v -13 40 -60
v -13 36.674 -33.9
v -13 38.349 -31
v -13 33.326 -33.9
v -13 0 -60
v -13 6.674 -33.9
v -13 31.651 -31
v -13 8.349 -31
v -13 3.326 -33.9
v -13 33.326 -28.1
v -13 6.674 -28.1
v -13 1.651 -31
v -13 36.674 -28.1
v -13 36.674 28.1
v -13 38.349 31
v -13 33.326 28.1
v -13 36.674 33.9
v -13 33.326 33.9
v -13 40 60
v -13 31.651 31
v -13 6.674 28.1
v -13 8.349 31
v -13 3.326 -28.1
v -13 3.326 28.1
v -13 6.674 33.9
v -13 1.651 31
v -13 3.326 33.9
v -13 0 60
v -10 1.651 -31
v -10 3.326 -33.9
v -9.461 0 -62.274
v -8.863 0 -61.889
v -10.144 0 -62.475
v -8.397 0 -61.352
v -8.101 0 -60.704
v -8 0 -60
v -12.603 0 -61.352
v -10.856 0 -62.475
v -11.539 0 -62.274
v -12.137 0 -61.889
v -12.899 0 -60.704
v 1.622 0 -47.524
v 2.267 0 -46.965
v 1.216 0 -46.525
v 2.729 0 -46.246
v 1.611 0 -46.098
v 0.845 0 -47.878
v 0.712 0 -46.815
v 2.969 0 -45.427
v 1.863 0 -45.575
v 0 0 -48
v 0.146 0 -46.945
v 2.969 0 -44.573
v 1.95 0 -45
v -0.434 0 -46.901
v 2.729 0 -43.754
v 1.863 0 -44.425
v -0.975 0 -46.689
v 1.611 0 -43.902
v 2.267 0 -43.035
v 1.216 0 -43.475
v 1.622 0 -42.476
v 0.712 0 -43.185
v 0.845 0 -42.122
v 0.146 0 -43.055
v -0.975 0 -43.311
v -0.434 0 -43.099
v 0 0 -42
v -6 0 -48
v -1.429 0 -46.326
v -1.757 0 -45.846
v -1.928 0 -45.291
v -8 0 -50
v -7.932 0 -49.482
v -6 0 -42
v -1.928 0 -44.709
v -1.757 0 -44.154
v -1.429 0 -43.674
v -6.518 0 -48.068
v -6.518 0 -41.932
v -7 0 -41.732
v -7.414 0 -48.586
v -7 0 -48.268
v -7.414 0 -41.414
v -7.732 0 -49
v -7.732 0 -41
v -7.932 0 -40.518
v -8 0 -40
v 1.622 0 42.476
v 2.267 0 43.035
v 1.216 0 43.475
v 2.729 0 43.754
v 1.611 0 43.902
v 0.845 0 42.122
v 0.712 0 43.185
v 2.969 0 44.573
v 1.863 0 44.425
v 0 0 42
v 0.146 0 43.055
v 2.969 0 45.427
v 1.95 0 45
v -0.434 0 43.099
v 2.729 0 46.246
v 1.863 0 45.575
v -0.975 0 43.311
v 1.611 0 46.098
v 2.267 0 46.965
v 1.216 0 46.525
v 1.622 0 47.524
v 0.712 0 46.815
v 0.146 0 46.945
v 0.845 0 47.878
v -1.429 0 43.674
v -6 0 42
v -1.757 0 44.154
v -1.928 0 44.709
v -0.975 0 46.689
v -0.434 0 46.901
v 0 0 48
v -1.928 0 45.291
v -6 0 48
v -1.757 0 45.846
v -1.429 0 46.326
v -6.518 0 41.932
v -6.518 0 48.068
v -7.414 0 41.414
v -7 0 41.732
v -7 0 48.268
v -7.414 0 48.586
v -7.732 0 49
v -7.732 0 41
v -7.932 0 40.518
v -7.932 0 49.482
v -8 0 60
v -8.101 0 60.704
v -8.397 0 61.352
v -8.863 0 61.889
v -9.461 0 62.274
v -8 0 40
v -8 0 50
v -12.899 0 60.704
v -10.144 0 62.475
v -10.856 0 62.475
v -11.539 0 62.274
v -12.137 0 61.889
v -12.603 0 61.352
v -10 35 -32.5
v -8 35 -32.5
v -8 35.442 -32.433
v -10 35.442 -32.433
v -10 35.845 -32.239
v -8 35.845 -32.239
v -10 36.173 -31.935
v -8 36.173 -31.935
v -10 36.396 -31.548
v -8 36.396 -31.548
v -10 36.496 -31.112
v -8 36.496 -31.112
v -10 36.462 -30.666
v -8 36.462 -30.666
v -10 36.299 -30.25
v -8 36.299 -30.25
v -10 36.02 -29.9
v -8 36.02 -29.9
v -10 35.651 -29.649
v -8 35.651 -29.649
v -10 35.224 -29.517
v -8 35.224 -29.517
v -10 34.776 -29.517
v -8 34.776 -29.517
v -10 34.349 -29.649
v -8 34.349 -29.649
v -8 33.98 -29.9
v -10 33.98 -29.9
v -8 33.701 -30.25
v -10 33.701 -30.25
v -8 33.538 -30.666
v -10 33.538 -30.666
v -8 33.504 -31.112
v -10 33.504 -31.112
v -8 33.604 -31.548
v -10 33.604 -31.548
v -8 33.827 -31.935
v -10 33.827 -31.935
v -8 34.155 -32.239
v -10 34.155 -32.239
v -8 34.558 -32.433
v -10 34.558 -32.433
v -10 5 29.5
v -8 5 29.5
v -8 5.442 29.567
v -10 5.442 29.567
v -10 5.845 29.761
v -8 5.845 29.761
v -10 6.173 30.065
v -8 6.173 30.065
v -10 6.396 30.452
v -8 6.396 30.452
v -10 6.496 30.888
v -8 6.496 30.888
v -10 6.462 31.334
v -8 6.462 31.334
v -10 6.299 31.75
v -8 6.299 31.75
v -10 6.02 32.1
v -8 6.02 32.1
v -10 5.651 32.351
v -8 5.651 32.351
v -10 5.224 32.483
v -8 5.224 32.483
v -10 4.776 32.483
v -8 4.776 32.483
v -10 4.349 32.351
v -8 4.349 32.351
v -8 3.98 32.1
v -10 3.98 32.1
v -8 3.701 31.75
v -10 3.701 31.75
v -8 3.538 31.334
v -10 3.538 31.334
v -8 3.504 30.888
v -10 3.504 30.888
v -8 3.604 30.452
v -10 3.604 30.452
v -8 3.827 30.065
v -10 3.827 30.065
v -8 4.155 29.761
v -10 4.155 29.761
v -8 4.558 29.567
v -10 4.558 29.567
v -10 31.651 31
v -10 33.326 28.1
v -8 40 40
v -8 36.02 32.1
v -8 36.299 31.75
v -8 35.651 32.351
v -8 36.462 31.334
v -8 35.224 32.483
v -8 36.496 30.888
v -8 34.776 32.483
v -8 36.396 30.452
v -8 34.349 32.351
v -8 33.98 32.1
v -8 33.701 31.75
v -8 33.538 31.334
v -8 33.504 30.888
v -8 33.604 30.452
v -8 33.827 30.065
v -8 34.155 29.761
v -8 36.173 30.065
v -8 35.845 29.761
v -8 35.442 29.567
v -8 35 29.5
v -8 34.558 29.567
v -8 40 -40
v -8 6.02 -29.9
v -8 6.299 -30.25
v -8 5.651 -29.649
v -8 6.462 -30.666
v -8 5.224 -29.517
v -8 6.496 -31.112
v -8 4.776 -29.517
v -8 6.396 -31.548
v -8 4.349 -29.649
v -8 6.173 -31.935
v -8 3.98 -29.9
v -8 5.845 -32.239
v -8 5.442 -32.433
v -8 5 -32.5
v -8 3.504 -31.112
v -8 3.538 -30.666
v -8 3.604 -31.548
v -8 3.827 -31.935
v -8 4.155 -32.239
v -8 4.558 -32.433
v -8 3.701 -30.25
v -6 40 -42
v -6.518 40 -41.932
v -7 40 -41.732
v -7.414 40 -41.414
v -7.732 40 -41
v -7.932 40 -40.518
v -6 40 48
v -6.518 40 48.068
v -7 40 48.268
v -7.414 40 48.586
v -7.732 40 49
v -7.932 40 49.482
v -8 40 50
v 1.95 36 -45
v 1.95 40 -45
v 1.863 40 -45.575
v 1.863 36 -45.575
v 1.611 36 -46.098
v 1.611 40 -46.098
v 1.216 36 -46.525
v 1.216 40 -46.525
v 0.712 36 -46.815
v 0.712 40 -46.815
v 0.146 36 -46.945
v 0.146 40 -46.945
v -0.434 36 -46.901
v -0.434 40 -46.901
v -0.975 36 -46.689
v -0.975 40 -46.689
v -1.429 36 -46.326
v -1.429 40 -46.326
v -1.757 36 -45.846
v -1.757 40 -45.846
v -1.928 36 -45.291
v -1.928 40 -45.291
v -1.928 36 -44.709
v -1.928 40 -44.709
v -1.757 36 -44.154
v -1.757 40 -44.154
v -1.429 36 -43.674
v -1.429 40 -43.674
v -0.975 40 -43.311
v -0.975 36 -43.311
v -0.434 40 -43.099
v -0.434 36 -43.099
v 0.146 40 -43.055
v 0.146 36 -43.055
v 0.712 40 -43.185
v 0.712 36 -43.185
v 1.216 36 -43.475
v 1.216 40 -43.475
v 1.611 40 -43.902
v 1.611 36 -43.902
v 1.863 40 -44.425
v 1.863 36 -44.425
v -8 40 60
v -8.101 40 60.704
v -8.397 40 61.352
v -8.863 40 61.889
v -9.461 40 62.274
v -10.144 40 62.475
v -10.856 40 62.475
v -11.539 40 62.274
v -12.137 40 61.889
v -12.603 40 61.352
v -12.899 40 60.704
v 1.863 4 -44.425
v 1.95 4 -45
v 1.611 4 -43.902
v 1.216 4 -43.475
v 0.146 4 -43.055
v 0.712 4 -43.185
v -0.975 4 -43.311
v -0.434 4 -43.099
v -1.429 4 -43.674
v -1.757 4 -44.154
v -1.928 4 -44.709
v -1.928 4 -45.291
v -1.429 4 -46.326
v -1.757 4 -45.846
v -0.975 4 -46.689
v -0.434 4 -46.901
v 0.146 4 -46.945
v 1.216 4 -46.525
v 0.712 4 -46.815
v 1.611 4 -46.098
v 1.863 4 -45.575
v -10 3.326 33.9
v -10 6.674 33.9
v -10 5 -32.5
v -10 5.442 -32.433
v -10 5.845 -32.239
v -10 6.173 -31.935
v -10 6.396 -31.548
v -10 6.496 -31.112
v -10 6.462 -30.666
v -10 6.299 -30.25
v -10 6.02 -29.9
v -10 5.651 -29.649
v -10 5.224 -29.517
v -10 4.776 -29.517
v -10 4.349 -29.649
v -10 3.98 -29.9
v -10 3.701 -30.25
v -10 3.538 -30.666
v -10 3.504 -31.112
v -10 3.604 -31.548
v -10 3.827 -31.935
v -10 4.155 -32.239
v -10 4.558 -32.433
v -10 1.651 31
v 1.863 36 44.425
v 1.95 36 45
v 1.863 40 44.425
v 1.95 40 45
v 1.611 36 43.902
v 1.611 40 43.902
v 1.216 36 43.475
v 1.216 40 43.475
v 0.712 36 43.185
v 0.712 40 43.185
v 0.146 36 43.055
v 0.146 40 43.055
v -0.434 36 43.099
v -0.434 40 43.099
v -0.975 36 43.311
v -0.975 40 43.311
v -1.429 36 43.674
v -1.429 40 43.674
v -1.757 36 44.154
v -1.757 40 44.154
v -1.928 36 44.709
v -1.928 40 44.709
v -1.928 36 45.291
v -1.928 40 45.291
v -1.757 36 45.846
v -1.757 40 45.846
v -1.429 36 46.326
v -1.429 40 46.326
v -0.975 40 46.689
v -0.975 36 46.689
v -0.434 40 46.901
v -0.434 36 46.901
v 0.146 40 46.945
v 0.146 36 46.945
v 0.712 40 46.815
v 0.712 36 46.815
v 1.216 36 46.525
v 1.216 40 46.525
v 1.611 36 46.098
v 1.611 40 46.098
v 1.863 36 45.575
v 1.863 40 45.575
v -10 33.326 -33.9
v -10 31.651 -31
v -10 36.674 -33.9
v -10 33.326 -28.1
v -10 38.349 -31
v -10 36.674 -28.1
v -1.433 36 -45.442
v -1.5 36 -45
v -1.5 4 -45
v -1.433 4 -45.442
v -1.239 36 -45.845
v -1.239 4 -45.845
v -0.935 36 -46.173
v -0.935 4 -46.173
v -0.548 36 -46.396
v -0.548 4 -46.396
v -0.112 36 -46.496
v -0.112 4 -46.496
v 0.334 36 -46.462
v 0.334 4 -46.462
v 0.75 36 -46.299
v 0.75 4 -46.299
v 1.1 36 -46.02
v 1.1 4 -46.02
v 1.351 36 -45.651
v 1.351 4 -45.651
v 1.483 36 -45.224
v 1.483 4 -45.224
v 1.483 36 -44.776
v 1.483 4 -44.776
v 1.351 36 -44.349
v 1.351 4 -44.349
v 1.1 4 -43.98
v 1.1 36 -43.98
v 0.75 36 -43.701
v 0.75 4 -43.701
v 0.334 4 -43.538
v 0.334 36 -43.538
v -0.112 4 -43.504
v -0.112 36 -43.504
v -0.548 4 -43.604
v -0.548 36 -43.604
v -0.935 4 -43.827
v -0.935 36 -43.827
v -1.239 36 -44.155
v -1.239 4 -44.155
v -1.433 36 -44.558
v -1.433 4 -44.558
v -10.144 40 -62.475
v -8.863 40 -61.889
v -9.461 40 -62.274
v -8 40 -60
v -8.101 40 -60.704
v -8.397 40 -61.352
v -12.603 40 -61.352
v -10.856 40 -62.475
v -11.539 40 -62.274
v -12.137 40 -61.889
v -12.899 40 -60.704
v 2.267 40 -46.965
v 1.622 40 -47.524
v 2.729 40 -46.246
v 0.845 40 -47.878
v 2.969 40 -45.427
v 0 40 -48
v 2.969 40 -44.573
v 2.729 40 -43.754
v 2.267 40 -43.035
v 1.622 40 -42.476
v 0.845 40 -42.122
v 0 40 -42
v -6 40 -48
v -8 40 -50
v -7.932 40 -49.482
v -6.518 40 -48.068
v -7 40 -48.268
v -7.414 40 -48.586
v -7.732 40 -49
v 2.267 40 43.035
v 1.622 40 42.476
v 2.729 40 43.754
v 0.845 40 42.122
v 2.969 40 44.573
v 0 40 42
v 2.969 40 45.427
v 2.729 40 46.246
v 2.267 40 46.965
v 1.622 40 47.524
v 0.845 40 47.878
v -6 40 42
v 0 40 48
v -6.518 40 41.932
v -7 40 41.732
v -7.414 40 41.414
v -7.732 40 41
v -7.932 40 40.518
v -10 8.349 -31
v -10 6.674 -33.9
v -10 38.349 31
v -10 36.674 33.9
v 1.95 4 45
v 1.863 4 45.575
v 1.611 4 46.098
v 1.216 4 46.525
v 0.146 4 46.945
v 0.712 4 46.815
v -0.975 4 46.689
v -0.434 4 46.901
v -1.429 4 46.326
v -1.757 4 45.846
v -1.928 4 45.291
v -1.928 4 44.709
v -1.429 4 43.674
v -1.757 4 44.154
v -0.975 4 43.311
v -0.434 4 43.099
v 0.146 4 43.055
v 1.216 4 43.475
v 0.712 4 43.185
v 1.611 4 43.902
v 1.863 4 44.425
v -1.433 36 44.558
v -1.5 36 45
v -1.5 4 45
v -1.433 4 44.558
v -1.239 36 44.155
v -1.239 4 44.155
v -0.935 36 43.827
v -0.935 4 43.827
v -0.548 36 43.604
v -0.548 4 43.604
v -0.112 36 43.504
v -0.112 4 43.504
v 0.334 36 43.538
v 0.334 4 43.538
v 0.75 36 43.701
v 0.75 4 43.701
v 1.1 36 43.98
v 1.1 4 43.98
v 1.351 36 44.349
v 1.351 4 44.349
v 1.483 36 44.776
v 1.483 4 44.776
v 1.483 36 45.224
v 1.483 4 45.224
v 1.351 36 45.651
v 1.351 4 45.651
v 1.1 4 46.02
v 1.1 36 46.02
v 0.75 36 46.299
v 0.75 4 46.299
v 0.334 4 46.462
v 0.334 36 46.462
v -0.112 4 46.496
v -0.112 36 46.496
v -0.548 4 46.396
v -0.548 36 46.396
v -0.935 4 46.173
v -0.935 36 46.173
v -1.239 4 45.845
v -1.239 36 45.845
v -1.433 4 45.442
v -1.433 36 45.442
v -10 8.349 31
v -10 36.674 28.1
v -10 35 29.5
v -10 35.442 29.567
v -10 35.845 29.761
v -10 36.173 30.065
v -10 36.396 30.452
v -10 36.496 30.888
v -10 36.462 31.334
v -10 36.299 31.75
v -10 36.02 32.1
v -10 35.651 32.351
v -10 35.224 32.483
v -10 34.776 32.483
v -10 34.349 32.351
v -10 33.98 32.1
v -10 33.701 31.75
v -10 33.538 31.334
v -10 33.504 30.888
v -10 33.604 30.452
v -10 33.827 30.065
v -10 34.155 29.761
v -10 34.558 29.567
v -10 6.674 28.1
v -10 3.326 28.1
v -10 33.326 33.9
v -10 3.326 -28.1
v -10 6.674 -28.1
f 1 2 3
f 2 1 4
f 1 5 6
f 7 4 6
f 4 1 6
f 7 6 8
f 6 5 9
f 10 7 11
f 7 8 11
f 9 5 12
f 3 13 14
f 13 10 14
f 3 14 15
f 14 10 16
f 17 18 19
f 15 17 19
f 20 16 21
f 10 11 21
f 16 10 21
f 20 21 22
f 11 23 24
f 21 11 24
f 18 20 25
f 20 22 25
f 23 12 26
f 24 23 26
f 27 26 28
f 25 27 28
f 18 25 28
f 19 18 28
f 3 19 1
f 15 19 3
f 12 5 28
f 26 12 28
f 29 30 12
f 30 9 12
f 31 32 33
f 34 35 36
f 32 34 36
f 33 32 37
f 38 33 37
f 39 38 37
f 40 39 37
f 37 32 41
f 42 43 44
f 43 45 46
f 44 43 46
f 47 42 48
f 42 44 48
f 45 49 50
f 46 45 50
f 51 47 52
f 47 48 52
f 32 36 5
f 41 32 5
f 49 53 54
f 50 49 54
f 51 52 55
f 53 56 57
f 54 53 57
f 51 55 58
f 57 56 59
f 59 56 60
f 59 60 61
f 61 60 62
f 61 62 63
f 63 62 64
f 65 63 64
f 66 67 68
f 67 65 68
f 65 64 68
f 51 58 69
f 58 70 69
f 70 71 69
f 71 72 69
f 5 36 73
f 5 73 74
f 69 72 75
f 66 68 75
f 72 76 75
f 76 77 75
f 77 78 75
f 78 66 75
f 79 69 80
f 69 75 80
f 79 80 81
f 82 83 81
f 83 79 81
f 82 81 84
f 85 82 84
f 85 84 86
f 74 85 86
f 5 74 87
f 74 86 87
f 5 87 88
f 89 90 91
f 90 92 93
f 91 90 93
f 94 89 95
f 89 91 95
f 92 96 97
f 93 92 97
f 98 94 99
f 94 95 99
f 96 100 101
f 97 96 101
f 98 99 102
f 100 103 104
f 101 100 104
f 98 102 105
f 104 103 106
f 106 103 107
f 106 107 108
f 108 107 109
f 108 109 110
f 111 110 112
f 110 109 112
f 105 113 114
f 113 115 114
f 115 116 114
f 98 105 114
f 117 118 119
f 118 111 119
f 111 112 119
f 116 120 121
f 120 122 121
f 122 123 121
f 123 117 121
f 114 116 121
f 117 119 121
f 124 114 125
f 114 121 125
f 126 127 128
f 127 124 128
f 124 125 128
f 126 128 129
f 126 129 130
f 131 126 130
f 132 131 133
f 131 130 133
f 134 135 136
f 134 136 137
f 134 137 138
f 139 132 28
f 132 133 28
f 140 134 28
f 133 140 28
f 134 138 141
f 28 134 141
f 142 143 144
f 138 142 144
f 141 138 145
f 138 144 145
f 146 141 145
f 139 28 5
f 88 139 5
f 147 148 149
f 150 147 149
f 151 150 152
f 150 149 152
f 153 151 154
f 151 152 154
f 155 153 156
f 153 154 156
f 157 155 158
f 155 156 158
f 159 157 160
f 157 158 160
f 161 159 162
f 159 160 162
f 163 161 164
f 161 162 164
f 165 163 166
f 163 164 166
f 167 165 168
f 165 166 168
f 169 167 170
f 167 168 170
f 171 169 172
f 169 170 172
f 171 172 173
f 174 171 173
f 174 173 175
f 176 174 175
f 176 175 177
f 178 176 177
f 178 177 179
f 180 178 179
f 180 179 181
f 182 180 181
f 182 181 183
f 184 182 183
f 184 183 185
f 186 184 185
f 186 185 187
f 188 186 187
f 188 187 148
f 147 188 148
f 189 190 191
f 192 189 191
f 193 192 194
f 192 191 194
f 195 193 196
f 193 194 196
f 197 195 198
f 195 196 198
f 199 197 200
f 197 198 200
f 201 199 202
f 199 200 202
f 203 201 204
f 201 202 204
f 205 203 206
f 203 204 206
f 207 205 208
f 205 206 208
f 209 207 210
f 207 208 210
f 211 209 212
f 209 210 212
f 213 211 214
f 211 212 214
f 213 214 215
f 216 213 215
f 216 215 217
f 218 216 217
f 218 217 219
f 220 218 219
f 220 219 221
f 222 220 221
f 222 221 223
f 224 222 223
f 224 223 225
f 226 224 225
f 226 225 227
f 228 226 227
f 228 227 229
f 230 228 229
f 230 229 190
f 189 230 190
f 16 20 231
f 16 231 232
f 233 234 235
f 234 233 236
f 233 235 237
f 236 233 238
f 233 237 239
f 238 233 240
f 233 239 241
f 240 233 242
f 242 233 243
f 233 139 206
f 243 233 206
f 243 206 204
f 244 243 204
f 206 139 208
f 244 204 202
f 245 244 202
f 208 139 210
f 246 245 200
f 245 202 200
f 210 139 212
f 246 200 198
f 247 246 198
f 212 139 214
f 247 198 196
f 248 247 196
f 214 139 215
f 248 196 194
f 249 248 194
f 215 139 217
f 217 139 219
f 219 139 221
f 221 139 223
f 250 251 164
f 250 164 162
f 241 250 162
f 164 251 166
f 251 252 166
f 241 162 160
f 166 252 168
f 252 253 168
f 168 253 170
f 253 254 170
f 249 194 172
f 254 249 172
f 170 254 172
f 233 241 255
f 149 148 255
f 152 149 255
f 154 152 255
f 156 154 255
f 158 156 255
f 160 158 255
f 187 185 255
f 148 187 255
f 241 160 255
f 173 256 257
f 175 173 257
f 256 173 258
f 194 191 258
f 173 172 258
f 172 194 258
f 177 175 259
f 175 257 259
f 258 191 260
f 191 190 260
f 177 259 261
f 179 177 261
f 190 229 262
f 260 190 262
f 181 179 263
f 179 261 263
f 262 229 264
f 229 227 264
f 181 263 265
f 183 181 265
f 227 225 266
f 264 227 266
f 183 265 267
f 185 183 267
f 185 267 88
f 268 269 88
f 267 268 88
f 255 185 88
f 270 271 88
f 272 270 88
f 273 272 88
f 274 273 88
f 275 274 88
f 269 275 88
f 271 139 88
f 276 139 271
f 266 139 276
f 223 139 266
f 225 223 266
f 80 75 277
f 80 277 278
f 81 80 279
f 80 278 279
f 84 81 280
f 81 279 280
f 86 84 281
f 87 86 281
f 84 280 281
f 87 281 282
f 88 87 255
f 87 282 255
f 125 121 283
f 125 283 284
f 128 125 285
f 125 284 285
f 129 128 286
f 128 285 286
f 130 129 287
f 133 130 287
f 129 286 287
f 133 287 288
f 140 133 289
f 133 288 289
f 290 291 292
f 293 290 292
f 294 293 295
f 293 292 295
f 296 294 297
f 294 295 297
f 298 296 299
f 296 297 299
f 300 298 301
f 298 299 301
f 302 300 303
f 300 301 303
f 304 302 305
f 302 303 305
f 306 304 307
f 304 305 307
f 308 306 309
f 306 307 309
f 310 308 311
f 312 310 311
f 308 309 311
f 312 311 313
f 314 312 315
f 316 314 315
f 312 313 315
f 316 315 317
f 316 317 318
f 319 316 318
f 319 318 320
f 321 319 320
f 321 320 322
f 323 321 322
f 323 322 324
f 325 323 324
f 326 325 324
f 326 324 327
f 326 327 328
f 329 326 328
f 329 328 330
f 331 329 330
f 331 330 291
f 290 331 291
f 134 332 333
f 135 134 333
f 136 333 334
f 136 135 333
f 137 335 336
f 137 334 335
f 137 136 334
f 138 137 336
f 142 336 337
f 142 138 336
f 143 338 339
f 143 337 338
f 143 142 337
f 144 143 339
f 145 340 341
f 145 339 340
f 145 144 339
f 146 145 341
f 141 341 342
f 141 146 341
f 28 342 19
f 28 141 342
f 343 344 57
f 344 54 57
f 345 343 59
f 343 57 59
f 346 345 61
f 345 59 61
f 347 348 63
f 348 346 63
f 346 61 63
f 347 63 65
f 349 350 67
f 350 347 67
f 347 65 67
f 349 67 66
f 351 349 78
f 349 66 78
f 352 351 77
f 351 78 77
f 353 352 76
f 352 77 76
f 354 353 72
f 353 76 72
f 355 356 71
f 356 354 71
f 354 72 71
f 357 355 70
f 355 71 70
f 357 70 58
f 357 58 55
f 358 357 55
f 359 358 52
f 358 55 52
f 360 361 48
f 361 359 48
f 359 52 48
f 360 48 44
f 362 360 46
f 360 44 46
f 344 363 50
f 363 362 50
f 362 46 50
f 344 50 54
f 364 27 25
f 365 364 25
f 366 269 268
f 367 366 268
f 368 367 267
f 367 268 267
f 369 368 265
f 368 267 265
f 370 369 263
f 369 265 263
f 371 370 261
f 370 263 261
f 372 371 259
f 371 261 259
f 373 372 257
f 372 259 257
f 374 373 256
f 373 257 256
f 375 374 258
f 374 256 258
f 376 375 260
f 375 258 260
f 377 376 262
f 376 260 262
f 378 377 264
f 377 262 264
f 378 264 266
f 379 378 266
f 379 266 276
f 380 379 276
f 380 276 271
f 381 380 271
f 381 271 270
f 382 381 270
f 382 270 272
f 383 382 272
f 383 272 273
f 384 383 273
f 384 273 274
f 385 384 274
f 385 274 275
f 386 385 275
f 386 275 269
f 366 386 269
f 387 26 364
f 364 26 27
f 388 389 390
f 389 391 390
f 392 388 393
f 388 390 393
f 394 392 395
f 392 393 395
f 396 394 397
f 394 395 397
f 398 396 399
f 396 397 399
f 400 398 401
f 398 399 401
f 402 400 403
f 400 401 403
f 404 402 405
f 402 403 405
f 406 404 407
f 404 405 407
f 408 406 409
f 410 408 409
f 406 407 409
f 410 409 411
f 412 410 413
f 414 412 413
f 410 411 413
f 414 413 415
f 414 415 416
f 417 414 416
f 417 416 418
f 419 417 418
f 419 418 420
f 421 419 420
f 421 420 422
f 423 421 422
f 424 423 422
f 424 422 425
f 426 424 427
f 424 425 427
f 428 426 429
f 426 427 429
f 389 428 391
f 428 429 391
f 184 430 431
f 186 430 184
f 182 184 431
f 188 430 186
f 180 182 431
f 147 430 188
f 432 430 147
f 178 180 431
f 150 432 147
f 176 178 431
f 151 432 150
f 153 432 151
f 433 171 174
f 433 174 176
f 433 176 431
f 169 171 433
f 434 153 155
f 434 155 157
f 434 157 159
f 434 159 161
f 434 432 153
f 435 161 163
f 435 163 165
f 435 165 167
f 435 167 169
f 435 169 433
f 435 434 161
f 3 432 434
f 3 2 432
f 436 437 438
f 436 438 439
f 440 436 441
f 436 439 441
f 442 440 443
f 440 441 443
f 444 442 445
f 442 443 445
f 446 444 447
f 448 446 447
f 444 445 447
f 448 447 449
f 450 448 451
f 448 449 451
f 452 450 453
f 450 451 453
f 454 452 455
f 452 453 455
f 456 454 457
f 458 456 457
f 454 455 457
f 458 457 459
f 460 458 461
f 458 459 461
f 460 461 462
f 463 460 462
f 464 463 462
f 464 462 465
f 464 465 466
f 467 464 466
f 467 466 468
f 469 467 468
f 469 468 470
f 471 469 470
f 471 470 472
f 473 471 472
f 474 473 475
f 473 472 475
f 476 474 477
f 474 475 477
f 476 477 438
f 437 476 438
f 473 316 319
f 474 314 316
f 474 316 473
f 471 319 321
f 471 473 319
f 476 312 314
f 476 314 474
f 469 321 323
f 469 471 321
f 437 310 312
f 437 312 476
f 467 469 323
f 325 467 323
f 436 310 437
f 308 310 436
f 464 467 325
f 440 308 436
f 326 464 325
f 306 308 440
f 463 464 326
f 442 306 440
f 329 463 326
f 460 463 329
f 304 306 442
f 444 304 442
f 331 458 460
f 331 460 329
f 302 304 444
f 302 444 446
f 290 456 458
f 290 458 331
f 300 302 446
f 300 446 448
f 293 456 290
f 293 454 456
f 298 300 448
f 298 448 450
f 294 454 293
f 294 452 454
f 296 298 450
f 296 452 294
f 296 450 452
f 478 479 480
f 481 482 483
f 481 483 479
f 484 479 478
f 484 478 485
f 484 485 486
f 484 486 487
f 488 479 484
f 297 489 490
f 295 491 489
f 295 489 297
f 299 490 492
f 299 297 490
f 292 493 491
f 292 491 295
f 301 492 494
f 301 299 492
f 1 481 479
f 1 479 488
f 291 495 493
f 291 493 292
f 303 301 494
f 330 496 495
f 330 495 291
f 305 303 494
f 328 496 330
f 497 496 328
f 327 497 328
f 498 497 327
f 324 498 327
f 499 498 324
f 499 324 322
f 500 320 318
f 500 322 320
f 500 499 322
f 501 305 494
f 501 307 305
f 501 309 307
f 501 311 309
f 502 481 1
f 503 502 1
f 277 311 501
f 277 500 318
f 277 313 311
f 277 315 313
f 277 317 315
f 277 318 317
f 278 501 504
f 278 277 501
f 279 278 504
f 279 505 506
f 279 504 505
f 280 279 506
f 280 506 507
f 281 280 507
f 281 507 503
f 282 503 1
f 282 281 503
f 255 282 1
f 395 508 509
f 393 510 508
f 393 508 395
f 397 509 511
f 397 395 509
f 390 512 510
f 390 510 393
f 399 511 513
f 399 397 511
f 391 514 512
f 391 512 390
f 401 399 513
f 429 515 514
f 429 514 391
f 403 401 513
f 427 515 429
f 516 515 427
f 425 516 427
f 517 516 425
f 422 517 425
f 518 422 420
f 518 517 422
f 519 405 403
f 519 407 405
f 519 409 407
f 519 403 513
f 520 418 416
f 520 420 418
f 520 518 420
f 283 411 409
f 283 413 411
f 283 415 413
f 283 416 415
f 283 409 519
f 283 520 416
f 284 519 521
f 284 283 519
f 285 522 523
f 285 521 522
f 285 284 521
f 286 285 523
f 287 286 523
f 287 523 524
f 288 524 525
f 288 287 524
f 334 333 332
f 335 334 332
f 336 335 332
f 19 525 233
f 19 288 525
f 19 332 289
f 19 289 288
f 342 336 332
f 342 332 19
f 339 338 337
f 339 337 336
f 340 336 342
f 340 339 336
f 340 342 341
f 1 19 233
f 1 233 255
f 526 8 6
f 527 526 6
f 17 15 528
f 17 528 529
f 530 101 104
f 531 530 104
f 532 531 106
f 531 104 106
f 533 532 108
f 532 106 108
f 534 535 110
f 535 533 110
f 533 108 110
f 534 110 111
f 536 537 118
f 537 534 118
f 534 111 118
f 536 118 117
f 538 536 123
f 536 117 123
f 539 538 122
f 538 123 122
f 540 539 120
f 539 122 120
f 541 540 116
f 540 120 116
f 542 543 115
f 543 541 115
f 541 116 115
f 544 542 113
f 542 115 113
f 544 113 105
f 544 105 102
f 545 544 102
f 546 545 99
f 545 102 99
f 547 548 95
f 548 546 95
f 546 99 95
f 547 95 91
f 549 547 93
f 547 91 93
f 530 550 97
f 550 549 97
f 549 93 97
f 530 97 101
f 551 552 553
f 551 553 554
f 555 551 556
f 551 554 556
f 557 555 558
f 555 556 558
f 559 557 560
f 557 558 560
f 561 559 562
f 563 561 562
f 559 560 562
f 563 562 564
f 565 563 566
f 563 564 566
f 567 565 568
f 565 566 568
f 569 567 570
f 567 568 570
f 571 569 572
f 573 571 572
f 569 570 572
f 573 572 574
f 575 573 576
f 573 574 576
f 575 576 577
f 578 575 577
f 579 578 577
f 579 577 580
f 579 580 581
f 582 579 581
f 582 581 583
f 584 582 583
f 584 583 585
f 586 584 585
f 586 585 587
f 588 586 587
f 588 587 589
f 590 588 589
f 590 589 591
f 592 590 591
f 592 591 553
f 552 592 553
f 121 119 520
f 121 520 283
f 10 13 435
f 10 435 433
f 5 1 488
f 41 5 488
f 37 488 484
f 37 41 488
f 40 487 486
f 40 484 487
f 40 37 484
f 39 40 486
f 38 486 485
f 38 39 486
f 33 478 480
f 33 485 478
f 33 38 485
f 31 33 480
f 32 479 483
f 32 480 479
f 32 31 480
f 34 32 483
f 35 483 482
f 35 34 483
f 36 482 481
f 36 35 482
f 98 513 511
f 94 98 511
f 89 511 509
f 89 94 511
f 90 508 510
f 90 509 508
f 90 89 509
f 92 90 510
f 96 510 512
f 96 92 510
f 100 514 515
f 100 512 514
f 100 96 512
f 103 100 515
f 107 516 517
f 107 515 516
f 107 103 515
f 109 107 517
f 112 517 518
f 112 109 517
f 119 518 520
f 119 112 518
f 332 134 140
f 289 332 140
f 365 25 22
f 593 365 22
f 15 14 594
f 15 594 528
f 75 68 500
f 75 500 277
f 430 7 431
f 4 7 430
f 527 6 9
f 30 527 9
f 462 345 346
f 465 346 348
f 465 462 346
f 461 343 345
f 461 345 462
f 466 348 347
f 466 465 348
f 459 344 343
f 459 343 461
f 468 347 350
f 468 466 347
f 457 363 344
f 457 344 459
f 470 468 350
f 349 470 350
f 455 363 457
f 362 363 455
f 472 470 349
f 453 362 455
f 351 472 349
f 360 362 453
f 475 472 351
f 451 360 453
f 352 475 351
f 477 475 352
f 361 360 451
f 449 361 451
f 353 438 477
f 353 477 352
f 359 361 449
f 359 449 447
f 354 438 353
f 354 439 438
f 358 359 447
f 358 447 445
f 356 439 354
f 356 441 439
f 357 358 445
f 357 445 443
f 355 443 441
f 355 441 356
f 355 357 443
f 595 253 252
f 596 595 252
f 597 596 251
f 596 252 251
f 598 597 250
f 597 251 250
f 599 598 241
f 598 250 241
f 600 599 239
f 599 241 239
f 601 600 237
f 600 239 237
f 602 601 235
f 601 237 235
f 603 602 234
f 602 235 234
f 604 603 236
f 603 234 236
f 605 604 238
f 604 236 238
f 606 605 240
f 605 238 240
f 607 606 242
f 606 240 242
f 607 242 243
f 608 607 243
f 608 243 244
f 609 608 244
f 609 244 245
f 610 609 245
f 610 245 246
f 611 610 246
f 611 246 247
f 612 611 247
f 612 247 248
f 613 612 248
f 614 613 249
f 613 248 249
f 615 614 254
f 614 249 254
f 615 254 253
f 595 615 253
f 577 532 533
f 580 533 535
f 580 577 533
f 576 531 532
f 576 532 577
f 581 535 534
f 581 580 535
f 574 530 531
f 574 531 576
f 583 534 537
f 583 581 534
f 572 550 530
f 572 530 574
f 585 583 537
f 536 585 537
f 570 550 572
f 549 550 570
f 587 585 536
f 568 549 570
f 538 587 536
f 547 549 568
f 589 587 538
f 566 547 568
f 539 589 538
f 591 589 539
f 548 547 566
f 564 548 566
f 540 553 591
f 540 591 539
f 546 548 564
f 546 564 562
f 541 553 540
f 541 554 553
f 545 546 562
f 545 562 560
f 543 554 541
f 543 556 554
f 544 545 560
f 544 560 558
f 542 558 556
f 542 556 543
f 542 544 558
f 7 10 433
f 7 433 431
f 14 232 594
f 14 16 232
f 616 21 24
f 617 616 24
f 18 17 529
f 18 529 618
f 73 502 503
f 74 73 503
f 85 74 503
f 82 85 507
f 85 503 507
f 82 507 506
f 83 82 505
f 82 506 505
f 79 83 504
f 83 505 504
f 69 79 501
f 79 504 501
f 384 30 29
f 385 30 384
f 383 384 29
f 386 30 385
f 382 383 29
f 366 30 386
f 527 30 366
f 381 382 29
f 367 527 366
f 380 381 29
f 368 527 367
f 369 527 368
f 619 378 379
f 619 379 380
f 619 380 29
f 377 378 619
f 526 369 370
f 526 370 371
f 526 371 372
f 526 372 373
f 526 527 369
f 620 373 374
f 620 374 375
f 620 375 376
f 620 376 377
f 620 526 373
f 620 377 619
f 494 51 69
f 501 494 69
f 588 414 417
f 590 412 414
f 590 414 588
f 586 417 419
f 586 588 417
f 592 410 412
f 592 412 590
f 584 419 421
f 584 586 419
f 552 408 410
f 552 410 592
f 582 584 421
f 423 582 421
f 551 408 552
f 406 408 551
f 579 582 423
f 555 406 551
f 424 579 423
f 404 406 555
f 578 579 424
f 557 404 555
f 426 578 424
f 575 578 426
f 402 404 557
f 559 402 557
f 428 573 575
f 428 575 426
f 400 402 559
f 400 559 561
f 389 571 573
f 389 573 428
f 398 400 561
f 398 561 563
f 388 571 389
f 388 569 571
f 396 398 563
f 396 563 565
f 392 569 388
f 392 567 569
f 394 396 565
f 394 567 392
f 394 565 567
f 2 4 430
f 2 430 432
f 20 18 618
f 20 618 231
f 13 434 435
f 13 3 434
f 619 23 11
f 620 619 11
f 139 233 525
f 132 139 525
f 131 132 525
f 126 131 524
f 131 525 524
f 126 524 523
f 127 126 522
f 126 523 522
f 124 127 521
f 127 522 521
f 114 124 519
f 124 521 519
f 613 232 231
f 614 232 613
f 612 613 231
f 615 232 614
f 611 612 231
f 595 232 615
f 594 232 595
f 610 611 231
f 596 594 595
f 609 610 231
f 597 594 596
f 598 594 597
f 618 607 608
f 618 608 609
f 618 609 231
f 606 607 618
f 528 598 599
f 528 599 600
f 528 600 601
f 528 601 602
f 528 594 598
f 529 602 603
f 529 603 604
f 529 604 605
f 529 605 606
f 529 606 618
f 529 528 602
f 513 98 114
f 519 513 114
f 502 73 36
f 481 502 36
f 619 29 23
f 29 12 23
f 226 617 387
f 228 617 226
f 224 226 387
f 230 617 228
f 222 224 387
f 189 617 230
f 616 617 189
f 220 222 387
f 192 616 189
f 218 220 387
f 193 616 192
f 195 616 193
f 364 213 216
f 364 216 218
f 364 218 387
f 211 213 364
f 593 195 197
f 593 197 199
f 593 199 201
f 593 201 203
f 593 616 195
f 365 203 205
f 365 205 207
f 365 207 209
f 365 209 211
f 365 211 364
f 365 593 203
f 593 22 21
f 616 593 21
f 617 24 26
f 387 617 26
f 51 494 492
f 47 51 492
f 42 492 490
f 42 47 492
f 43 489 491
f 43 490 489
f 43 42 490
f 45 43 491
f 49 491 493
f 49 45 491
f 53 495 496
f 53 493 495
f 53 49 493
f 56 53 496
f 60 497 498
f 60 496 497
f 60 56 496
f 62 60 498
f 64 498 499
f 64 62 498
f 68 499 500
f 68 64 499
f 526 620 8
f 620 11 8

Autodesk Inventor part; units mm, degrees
ref_plane "YZ Plane" through (0, 0, 0) normal (1, 0, 0) x (0, 1, 0)
ref_plane "XZ Plane" through (0, 0, 0) normal (0, 1, 0) x (-1, 0, 0)
sketch "Эскиз1" plane through (0, 0, 0) normal (0, 1, 0) x (-1, 0, 0)
  line L0 (0, 45) -> (0, -45) construction
  circle A0 centre (0, 45) radius 1.5
  circle A1 centre (0, -45) radius 1.5
  line L1 (10.5, 60) -> (10.5, -60) construction
  line L2 (10.5, -60) -> (10.5, 60) construction
  line L3 (13, -60) -> (13, 60)
  line L4 (8, 60) -> (8, 48)
  arc A2 (8, -60) -> (13, -60) centre (10.5, -60) ccw
  arc A3 (13, 60) -> (8, 60) centre (10.5, 60) ccw
  arc A4 (0, 42) -> (0, 48) centre (0, 45) ccw construction
  arc A5 (0, -48) -> (0, -42) centre (0, -45) ccw construction
  line L5 (0, 48) -> (8, 48)
  line L6 (0, 42) -> (8, 42)
  line L7 (0, -42) -> (8, -42)
  line L8 (0, -48) -> (8, -48)
  arc A6 (0, -42) -> (0, -48) centre (0, -45) ccw
  arc A7 (0, 48) -> (0, 42) centre (0, 45) ccw
  line L9 (8, -42) -> (8, -48) construction
  line L10 (8, 42) -> (8, -42)
  line L11 (8, -48) -> (8, -60)
  line L12 (8, 48) -> (8, 42) construction
  point P0 (0, 0)
  point P1 (0, 0)
  point P2 (10.5, 0)
  dimension "d0" = 90
  dimension "d1" = 3
  dimension "d2" = 3
  dimension "d3" = 120
  dimension "d4" = 10.5
  dimension "d5" = 0
  dimension "d6" = 5
  dimension "d7" = 6
  dimension "d8" = 6
extrude "Выдавливание1" add sketch "Эскиз1" along normal blind 40
fillet "Сопряжение1" radius 2 4 edges at (-8, 20, 42) (-8, 20, 48) (-8, 20, -42) (-8, 20, -48)
sketch "Эскиз2" plane through (0, 40, 0) normal (0, 1, 0) x (1, 0, 0)
  line L0 (0, 48) -> (-6, 48) projected
  arc A0 (-8, 50) -> (-6, 48) centre (-6, 50) ccw projected
  line L1 (-8, 50) -> (-8, 60) projected
  arc A1 (-8, 60) -> (-13, 60) centre (-10.5, 60) ccw projected
  line L2 (-13, 60) -> (-13, -60) projected
  arc A2 (-13, -60) -> (-8, -60) centre (-10.5, -60) ccw projected
  line L3 (-8, -60) -> (-8, -50) projected
  arc A3 (-6, -48) -> (-8, -50) centre (-6, -50) ccw projected
  line L4 (-6, -48) -> (0, -48) projected
  arc A4 (0, -48) -> (0, -42) centre (0, -45) ccw projected
  line L5 (0, -42) -> (-6, -42) projected
  arc A5 (-8, -40) -> (-6, -42) centre (-6, -40) ccw projected
  line L6 (-8, -40) -> (-8, 40) projected
  arc A6 (-6, 42) -> (-8, 40) centre (-6, 40) ccw projected
  line L7 (-6, 42) -> (0, 42) projected
  arc A7 (0, 42) -> (0, 48) centre (0, 45) ccw projected
  circle A8 centre (0, -45) radius 1.5 projected
  circle A9 centre (0, 45) radius 1.5 projected
  circle A10 centre (0, -45) radius 1.95
  circle A11 centre (0, 45) radius 1.95
  point P0 (0, 0)
  dimension "d12" = 3.9
  dimension "d13" = 3.9
extrude "Выдавливание2" cut sketch "Эскиз2" against normal blind 4 contours A8 | A9 | A10 | A11
ref_plane "РабПлоскость1" through (0, 20, 0) normal (0, 1, 0) x (1, 0, 0)
mirror "Зеркальное отражение1" about plane through (0, 20, 0) normal (0, 1, 0) of "Выдавливание2"
sketch "Эскиз3" plane through (-8, 0, 40) normal (1, 0, 0) x (0, 0, -1)
  line L0 (40, 0) -> (40, 40) construction
  line L1 (0, 40) -> (80, 40) projected
  line L2 (71, 5) -> (9, 5) construction
  line L3 (9, 5) -> (9, 35) construction
  line L4 (9, 35) -> (71, 35) construction
  line L5 (71, 35) -> (71, 5) construction
  line L6 (71, 5) -> (9, 35) construction
  line L7 (9, 5) -> (71, 35) construction
  circle A0 centre (9, 35) radius 1.5
  circle A1 centre (71, 35) radius 1.5
  circle A2 centre (9, 5) radius 1.5
  circle A3 centre (71, 5) radius 1.5
  point P0 (40, 20)
  dimension "d17" = 62
  dimension "d18" = 30
  dimension "d19" = 3
  dimension "d20" = 3
  dimension "d21" = 3
  dimension "d22" = 3
extrude "Выдавливание3" cut sketch "Эскиз3" against normal through all
sketch "Эскиз4" plane through (-13, 0, -60) normal (-1, 0, 0) x (0, 0, 1)
  circle A0 centre (29, 35) radius 1.5 projected
  circle A1 centre (91, 35) radius 1.5 projected
  line L0 (29, 35) -> (91, 35) construction
  circle A2 centre (91, 5) radius 1.5 projected
  line L1 (91, 35) -> (91, 5) construction
  line L2 (91, 20) -> (60, 20) construction
  line L3 (60, 20) -> (60, 35) construction
  line L4 (31.9, 36.6743) -> (31.9, 33.3257)
  line L5 (31.9, 33.3257) -> (29, 31.6514)
  line L6 (29, 31.6514) -> (26.1, 33.3257)
  line L7 (26.1, 33.3257) -> (26.1, 36.6743)
  line L8 (26.1, 36.6743) -> (29, 38.3486)
  line L9 (29, 38.3486) -> (31.9, 36.6743)
  circle A3 centre (29, 5) radius 1.5
  line L10 (31.9, 3.3257) -> (31.9, 6.6743)
  line L11 (31.9, 6.6743) -> (29, 8.3486)
  line L12 (29, 8.3486) -> (26.1, 6.6743)
  line L13 (26.1, 6.6743) -> (26.1, 3.3257)
  line L14 (26.1, 3.3257) -> (29, 1.6514)
  line L15 (29, 1.6514) -> (31.9, 3.3257)
  line L16 (91, 38.3486) -> (93.9, 36.6743)
  line L17 (93.9, 36.6743) -> (93.9, 33.3257)
  line L18 (93.9, 33.3257) -> (91, 31.6514)
  line L19 (91, 31.6514) -> (88.1, 33.3257)
  line L20 (88.1, 33.3257) -> (88.1, 36.6743)
  line L21 (88.1, 36.6743) -> (91, 38.3486)
  circle A4 centre (91, 5) radius 1.5
  line L22 (91, 1.6514) -> (93.9, 3.3257)
  line L23 (93.9, 3.3257) -> (93.9, 6.6743)
  line L24 (93.9, 6.6743) -> (91, 8.3486)
  line L25 (91, 8.3486) -> (88.1, 6.6743)
  line L26 (88.1, 6.6743) -> (88.1, 3.3257)
  line L27 (88.1, 3.3257) -> (91, 1.6514)
  point P0 (60, 0)
  dimension "d25" = 31
  dimension "d26" = 5.8
  dimension "d27" = 5.8
  dimension "d28" = 5.8
  dimension "d29" = 5.8
extrude "Выдавливание4" cut sketch "Эскиз4" against normal blind 3 contours A0 | A1 | A2 | L4 L5 L6 L7 L8 L9 | A3 | L15 L14 L13 L12 L11 L10 | L16 L17 L18 L19 L20 L21 | L27 L26 L25 L24 L23 L22
equation "\"d8\" = d7"
properties part number "pod_akkum_2"
